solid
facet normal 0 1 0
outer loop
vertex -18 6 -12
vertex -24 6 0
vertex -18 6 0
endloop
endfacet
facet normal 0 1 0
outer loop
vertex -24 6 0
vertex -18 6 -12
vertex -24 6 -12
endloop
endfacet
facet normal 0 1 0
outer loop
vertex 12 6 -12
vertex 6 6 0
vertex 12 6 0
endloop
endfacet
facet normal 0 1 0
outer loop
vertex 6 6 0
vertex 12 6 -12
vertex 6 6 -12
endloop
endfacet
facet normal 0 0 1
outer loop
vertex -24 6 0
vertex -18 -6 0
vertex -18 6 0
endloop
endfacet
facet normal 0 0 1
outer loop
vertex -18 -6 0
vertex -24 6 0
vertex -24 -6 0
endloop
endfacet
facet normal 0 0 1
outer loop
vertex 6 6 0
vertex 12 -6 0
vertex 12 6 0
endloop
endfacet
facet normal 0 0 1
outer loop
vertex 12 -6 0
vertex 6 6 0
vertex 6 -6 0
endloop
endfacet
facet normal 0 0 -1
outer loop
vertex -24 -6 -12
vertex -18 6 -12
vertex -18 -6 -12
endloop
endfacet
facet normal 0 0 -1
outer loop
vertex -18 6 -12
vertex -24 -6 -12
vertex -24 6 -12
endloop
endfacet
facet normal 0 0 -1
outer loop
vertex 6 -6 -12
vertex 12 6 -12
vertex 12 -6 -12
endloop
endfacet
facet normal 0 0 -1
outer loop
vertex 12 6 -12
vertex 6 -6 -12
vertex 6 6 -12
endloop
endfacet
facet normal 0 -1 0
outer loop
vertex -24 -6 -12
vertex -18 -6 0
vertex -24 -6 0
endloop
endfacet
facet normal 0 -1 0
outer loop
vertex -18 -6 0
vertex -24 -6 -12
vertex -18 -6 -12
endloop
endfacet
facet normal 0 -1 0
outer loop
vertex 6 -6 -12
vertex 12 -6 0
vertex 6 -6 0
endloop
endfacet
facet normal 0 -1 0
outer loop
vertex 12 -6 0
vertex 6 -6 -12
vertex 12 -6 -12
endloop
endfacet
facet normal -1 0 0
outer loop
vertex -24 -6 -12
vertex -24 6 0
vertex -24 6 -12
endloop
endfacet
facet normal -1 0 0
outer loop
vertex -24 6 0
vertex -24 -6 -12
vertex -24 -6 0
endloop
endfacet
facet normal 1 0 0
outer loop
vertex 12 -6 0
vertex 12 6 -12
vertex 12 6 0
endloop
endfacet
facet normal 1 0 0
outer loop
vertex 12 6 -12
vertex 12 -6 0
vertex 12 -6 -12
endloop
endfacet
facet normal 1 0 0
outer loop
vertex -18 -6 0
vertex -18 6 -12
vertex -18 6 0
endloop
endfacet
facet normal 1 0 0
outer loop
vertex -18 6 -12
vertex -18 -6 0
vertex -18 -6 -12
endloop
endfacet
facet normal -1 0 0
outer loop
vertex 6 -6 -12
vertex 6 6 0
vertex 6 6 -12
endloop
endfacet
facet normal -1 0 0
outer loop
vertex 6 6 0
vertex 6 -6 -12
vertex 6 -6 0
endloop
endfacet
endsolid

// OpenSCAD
use <MCAD/servos.scad>

servo_length = 12;
servo_width = 32;
servo_height = 31;
servo_mount_plate_height = 19;

servo_offset = (servo_width-20) / 2;

support_length = 12;
support_width = 36;
support_height = servo_height - servo_mount_plate_height;

echo("Calulated support height:", support_height);

module base_support() {
    x_offset = -support_length / 2;
    y_offset = -support_width/2 + servo_offset;
    z_offset = servo_mount_plate_height;
    
    translate([x_offset, y_offset, z_offset]) 
        cube([support_length, support_width, support_height]);
}

module spacer() {
    spacer_length = servo_length + 2;
    spacer_width = 22 + 2;
    spacer_height = support_height + 2;
    
    x_offset = -spacer_length / 2;
    y_offset = -spacer_width / 2 + servo_offset;
    z_offset = servo_mount_plate_height - 1;
    
    translate([x_offset, y_offset, z_offset]) 
        cube([spacer_length, spacer_width, spacer_height]);
}

module support_mount(show_ghost=false) {
    if (show_ghost) %alignds420();
    difference() {
        base_support();
        spacer();
    }
}

module aligned_support_mount(show_ghost=false) {
    translate([0, 0, -servo_height]) 
        rotate([0, 0,  90]) 
            support_mount(show_ghost);
}

// servo "ghost"

aligned_support_mount(true);
